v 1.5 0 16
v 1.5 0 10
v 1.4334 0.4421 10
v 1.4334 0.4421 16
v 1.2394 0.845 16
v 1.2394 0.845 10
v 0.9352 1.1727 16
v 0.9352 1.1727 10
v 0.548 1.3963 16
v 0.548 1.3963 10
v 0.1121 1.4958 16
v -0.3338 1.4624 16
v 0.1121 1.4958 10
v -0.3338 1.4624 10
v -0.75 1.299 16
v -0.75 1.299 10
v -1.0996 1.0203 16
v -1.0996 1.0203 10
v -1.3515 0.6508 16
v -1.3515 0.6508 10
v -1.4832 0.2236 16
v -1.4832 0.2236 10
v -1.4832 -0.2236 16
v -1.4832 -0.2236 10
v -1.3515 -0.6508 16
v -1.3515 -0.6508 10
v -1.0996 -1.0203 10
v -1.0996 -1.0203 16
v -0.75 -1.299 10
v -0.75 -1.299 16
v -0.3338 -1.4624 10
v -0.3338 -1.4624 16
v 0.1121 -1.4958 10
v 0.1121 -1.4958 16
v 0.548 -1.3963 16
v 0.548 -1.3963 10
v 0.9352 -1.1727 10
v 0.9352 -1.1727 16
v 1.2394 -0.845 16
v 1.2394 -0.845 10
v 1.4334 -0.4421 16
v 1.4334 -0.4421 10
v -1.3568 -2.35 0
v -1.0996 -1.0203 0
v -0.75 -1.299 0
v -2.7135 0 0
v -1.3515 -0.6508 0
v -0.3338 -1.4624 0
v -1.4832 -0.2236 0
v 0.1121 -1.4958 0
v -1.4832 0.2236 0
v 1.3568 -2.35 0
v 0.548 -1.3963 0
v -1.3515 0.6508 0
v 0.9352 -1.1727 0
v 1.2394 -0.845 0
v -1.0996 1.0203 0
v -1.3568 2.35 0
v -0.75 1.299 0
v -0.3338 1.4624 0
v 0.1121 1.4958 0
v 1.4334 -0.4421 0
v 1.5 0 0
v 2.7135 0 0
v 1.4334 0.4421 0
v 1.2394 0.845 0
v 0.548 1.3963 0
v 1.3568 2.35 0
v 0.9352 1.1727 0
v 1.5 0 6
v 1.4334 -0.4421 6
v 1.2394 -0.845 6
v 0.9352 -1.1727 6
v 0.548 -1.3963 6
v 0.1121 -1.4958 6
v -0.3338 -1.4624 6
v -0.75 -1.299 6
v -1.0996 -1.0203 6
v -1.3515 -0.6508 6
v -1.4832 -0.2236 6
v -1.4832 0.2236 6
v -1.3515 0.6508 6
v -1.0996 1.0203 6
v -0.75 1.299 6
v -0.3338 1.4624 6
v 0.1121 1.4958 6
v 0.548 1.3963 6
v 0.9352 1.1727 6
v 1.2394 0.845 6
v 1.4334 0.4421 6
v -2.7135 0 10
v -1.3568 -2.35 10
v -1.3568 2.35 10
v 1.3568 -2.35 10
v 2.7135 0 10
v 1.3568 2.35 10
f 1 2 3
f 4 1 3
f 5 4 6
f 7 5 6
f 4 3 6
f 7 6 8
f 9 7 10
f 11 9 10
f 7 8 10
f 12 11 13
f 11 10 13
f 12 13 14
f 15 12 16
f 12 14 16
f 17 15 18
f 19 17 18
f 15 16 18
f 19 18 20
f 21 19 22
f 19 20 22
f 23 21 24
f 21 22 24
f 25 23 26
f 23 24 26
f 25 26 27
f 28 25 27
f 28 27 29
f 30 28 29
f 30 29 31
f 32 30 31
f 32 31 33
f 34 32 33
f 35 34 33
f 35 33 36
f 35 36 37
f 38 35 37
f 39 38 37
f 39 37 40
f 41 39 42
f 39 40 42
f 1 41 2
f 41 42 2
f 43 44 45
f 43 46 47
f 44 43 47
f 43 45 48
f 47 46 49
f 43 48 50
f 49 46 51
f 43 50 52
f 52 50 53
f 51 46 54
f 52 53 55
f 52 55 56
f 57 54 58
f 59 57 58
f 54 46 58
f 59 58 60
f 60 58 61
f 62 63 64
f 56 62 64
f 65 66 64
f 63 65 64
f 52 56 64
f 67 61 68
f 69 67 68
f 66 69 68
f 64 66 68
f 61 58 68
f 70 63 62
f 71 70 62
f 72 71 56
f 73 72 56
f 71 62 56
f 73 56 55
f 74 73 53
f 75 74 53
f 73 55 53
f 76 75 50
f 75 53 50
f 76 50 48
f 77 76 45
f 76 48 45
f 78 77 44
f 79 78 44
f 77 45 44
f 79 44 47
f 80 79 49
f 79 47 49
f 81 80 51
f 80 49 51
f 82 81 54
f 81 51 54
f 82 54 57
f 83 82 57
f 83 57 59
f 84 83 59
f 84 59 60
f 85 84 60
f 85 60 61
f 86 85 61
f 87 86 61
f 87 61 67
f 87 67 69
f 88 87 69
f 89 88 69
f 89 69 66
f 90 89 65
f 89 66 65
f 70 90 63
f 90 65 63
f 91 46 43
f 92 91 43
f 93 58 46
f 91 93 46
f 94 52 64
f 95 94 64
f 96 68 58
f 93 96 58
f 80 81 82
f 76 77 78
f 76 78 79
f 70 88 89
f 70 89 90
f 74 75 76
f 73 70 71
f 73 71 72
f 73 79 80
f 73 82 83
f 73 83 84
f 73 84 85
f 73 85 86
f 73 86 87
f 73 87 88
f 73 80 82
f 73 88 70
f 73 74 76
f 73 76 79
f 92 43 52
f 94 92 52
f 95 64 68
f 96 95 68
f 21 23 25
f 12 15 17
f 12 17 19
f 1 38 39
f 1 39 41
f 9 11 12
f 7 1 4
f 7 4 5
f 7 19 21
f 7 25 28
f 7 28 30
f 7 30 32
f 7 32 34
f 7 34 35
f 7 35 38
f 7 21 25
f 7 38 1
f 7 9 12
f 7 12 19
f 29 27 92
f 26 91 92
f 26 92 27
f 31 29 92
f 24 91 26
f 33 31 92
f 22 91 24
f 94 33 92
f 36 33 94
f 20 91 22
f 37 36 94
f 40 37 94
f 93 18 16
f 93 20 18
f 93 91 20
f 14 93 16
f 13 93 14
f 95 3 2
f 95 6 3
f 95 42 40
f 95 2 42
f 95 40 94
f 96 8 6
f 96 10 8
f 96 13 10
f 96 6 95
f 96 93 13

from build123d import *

# Parameters (mm, degrees)
EXTRUDE_1_DEPTH     = 10
SKETCH_2_R          = 1.5
EXTRUDE_2_DEPTH     = 6
SKETCH_3_R          = 1.5
CUT_EXTRUDE_1_DEPTH = 6


with BuildPart() as part:
    # 草图1 → 凸台-拉伸1 (new body)
    with BuildSketch(Plane.XY):
        Polygon((2.713546265, 0), (1.356773133, 2.35), (-1.356773133, 2.35), (-2.713546265, 0), (-1.356773133, -2.35), (1.356773133, -2.35), align=None)
    extrude(amount=EXTRUDE_1_DEPTH)

    # 草图2 → 凸台-拉伸2 (add)
    with BuildSketch(Plane.XY.offset(10)):
        Circle(SKETCH_2_R)
    extrude(amount=EXTRUDE_2_DEPTH)

    # 草图3 → 切除-拉伸1 (cut)
    with BuildSketch(Plane(origin=(0, 0, 0), x_dir=(-1, 0, 0), z_dir=(0, 0, -1))):
        with Locations(Location((0, 0, 0), (0, 0, 180))):
            Circle(SKETCH_3_R)
    extrude(amount=-CUT_EXTRUDE_1_DEPTH, mode=Mode.SUBTRACT)


solid = part.part
